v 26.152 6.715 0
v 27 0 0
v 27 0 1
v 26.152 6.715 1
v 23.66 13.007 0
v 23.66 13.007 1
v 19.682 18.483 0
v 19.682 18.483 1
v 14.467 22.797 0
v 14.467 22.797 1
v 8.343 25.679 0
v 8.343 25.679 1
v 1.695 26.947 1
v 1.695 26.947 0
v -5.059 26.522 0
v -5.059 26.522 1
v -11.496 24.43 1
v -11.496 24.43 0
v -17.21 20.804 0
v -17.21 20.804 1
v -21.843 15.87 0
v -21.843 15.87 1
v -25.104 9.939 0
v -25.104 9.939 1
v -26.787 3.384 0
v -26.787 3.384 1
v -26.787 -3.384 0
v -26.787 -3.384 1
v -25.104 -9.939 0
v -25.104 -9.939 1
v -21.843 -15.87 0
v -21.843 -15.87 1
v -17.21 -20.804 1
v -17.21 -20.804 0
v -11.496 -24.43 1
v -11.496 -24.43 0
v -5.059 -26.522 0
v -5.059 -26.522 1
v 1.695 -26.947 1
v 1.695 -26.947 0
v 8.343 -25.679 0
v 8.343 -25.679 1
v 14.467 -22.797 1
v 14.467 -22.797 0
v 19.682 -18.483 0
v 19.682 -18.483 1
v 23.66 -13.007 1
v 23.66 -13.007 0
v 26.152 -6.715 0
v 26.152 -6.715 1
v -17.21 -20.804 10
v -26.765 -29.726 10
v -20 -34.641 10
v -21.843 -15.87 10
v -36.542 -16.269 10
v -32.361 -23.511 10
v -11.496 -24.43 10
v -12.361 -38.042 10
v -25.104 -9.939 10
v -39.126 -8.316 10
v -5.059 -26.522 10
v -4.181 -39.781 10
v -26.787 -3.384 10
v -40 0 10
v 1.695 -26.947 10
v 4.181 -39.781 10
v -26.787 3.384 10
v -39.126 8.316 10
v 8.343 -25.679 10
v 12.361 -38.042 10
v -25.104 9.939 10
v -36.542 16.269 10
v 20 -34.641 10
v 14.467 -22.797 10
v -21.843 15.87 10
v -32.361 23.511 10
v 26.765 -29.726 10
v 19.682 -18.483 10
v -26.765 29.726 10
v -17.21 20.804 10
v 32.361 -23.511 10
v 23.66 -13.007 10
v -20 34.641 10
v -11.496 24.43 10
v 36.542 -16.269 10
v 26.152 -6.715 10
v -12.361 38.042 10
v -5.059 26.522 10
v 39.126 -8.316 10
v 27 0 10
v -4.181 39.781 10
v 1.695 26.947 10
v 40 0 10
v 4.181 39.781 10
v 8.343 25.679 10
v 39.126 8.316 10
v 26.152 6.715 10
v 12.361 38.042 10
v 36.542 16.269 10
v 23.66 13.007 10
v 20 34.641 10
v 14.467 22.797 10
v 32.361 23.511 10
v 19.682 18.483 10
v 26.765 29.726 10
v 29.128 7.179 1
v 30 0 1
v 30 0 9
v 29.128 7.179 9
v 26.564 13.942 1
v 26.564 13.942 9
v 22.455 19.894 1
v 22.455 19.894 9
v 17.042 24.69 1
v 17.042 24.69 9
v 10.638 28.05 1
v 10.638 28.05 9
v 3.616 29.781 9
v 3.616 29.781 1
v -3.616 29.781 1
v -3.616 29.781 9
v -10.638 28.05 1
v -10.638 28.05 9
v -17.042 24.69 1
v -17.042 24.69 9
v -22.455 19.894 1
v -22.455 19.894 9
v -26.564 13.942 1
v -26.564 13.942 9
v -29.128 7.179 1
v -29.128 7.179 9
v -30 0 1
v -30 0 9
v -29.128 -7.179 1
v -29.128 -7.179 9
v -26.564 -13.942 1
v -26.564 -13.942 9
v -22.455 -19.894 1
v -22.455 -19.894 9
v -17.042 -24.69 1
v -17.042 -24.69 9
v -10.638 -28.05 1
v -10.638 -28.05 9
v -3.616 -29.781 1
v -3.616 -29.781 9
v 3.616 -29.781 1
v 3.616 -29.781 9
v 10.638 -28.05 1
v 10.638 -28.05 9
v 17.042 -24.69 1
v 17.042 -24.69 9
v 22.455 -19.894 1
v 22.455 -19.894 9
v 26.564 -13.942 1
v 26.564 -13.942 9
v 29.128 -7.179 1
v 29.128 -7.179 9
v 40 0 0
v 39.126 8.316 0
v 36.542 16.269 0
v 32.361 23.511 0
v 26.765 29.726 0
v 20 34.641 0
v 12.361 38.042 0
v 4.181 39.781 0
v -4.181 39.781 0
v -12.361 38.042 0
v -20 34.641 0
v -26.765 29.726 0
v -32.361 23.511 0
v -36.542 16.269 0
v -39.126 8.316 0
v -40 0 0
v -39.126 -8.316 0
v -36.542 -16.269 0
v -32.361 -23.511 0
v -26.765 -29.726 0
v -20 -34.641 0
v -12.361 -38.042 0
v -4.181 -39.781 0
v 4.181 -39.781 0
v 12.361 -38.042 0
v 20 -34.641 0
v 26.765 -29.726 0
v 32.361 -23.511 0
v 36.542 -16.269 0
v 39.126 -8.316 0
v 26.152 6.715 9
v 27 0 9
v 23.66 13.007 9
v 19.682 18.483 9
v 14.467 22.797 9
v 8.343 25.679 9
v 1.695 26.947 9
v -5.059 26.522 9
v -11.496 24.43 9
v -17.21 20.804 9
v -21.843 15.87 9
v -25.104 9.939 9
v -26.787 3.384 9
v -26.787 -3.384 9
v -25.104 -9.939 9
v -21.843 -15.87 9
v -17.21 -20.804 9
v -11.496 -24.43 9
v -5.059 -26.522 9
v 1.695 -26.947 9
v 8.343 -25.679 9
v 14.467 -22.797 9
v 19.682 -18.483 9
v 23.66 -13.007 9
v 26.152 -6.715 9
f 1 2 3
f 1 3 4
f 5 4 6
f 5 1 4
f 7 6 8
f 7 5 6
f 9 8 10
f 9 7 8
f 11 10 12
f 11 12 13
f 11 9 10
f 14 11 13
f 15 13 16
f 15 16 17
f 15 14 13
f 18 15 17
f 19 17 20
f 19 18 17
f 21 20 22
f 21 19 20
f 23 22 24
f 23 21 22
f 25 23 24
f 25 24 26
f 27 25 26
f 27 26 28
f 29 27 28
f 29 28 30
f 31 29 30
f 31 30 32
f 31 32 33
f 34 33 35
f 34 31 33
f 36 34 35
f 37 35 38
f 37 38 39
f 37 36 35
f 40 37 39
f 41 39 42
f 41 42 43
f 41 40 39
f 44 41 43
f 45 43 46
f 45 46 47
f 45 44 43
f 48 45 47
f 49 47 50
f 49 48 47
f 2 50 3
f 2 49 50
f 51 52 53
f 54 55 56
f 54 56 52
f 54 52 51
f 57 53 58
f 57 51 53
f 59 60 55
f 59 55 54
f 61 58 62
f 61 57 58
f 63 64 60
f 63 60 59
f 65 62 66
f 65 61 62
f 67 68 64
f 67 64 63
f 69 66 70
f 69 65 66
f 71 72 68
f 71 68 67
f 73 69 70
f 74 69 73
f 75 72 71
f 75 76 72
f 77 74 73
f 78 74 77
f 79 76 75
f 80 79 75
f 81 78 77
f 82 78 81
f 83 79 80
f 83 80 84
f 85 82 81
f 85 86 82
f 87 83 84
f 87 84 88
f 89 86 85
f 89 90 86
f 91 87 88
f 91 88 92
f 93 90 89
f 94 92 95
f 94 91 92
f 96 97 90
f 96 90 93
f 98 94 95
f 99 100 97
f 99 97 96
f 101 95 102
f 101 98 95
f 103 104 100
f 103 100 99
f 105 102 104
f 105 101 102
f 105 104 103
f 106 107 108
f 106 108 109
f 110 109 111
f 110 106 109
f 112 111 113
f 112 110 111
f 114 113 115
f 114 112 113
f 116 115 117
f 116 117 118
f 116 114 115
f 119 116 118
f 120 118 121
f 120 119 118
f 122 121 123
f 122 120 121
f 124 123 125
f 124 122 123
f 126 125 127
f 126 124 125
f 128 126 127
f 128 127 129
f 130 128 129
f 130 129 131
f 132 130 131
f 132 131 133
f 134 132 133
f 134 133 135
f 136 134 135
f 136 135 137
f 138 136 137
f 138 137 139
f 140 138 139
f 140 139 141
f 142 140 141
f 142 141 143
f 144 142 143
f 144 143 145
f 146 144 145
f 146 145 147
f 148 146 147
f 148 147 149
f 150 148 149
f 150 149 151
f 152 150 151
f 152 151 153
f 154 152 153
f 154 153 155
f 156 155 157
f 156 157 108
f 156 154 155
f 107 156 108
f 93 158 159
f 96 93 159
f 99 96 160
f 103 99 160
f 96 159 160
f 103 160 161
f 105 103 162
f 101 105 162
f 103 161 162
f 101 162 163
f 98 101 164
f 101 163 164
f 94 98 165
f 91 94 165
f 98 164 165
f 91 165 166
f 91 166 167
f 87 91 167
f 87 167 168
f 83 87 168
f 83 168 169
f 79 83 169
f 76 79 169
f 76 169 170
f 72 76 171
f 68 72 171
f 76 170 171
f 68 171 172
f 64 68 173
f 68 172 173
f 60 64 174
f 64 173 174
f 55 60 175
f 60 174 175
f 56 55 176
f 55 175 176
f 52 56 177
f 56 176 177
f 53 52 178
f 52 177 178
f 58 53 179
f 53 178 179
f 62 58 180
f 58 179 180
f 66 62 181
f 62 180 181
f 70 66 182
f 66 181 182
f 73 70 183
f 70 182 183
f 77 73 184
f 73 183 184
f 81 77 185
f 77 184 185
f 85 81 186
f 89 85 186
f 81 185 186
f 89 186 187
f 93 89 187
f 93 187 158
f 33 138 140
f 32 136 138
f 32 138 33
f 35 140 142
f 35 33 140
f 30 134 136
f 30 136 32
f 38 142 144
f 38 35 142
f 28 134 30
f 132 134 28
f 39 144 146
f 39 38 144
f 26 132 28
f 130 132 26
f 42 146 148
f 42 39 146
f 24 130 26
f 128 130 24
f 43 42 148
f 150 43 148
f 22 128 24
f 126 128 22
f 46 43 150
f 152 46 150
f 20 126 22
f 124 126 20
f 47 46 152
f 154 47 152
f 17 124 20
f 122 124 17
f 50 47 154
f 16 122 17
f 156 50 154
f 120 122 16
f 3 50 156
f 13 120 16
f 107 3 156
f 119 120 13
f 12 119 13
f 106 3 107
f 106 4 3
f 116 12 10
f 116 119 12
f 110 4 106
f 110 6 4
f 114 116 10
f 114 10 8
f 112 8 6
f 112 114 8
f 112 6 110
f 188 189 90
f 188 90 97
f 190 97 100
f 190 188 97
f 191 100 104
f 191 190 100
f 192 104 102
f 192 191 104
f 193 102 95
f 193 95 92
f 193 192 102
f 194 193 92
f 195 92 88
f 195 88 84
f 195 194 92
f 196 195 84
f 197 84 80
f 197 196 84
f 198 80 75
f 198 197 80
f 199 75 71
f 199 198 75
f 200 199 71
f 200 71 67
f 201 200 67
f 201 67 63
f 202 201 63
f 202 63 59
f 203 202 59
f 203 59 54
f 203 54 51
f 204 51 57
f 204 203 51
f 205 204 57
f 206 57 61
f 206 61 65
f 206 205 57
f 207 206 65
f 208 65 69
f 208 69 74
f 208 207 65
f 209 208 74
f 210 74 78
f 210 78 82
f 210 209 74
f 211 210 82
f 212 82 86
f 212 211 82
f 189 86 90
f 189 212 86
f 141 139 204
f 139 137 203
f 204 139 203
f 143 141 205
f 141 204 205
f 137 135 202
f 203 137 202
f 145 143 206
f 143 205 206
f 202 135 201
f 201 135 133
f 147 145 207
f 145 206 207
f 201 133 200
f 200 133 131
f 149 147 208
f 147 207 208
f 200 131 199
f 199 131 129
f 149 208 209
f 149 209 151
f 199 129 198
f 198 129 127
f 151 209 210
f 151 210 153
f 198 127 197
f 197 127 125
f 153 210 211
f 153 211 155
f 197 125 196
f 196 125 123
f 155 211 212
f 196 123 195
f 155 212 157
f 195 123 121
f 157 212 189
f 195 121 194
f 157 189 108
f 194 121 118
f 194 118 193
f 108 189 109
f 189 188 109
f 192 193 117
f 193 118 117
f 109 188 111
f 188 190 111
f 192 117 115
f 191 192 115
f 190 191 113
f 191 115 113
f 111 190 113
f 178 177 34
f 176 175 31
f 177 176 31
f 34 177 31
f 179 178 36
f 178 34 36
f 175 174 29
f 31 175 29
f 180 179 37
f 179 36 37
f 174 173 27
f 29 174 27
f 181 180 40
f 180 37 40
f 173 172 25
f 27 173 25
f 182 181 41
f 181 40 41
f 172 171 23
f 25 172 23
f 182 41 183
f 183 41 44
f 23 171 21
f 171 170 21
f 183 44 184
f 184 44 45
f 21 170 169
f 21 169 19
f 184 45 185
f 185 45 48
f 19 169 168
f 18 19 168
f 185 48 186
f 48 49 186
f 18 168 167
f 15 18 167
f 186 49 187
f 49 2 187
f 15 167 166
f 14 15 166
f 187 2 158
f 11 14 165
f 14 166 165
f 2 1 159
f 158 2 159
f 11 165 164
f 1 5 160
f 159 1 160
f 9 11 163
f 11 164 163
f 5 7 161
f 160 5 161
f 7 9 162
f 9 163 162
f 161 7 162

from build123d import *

# Parameters (mm, degrees)
SKETCH1_R           = 40
SKETCH1_R_2         = 30
BOSS_EXTRUDE1_DEPTH = 10
BOSS_EXTRUDE2_START = -1
SKETCH2_R           = 30
SKETCH2_R_2         = 27
BOSS_EXTRUDE2_DEPTH = 1
LPATTERN1_COUNT     = 2
LPATTERN1_PITCH     = 9


with BuildPart() as part:
    # Sketch1 → Boss-Extrude1 (new body)
    with BuildSketch(Plane.XY):
        Circle(SKETCH1_R)
        Circle(SKETCH1_R_2, mode=Mode.SUBTRACT)
    extrude(amount=BOSS_EXTRUDE1_DEPTH)

    # Sketch2 → Boss-Extrude2 (add)
    with BuildSketch(Plane.XY.offset(10).offset(BOSS_EXTRUDE2_START)):
        Circle(SKETCH2_R)
        Circle(SKETCH2_R_2, mode=Mode.SUBTRACT)
    boss_extrude2 = extrude(amount=BOSS_EXTRUDE2_DEPTH)

    # LPattern1: Boss-Extrude2 ×2
    with Locations(*[(0, 0, -i * LPATTERN1_PITCH) for i in range(1, LPATTERN1_COUNT)]):
        add(boss_extrude2)


solid = part.part
